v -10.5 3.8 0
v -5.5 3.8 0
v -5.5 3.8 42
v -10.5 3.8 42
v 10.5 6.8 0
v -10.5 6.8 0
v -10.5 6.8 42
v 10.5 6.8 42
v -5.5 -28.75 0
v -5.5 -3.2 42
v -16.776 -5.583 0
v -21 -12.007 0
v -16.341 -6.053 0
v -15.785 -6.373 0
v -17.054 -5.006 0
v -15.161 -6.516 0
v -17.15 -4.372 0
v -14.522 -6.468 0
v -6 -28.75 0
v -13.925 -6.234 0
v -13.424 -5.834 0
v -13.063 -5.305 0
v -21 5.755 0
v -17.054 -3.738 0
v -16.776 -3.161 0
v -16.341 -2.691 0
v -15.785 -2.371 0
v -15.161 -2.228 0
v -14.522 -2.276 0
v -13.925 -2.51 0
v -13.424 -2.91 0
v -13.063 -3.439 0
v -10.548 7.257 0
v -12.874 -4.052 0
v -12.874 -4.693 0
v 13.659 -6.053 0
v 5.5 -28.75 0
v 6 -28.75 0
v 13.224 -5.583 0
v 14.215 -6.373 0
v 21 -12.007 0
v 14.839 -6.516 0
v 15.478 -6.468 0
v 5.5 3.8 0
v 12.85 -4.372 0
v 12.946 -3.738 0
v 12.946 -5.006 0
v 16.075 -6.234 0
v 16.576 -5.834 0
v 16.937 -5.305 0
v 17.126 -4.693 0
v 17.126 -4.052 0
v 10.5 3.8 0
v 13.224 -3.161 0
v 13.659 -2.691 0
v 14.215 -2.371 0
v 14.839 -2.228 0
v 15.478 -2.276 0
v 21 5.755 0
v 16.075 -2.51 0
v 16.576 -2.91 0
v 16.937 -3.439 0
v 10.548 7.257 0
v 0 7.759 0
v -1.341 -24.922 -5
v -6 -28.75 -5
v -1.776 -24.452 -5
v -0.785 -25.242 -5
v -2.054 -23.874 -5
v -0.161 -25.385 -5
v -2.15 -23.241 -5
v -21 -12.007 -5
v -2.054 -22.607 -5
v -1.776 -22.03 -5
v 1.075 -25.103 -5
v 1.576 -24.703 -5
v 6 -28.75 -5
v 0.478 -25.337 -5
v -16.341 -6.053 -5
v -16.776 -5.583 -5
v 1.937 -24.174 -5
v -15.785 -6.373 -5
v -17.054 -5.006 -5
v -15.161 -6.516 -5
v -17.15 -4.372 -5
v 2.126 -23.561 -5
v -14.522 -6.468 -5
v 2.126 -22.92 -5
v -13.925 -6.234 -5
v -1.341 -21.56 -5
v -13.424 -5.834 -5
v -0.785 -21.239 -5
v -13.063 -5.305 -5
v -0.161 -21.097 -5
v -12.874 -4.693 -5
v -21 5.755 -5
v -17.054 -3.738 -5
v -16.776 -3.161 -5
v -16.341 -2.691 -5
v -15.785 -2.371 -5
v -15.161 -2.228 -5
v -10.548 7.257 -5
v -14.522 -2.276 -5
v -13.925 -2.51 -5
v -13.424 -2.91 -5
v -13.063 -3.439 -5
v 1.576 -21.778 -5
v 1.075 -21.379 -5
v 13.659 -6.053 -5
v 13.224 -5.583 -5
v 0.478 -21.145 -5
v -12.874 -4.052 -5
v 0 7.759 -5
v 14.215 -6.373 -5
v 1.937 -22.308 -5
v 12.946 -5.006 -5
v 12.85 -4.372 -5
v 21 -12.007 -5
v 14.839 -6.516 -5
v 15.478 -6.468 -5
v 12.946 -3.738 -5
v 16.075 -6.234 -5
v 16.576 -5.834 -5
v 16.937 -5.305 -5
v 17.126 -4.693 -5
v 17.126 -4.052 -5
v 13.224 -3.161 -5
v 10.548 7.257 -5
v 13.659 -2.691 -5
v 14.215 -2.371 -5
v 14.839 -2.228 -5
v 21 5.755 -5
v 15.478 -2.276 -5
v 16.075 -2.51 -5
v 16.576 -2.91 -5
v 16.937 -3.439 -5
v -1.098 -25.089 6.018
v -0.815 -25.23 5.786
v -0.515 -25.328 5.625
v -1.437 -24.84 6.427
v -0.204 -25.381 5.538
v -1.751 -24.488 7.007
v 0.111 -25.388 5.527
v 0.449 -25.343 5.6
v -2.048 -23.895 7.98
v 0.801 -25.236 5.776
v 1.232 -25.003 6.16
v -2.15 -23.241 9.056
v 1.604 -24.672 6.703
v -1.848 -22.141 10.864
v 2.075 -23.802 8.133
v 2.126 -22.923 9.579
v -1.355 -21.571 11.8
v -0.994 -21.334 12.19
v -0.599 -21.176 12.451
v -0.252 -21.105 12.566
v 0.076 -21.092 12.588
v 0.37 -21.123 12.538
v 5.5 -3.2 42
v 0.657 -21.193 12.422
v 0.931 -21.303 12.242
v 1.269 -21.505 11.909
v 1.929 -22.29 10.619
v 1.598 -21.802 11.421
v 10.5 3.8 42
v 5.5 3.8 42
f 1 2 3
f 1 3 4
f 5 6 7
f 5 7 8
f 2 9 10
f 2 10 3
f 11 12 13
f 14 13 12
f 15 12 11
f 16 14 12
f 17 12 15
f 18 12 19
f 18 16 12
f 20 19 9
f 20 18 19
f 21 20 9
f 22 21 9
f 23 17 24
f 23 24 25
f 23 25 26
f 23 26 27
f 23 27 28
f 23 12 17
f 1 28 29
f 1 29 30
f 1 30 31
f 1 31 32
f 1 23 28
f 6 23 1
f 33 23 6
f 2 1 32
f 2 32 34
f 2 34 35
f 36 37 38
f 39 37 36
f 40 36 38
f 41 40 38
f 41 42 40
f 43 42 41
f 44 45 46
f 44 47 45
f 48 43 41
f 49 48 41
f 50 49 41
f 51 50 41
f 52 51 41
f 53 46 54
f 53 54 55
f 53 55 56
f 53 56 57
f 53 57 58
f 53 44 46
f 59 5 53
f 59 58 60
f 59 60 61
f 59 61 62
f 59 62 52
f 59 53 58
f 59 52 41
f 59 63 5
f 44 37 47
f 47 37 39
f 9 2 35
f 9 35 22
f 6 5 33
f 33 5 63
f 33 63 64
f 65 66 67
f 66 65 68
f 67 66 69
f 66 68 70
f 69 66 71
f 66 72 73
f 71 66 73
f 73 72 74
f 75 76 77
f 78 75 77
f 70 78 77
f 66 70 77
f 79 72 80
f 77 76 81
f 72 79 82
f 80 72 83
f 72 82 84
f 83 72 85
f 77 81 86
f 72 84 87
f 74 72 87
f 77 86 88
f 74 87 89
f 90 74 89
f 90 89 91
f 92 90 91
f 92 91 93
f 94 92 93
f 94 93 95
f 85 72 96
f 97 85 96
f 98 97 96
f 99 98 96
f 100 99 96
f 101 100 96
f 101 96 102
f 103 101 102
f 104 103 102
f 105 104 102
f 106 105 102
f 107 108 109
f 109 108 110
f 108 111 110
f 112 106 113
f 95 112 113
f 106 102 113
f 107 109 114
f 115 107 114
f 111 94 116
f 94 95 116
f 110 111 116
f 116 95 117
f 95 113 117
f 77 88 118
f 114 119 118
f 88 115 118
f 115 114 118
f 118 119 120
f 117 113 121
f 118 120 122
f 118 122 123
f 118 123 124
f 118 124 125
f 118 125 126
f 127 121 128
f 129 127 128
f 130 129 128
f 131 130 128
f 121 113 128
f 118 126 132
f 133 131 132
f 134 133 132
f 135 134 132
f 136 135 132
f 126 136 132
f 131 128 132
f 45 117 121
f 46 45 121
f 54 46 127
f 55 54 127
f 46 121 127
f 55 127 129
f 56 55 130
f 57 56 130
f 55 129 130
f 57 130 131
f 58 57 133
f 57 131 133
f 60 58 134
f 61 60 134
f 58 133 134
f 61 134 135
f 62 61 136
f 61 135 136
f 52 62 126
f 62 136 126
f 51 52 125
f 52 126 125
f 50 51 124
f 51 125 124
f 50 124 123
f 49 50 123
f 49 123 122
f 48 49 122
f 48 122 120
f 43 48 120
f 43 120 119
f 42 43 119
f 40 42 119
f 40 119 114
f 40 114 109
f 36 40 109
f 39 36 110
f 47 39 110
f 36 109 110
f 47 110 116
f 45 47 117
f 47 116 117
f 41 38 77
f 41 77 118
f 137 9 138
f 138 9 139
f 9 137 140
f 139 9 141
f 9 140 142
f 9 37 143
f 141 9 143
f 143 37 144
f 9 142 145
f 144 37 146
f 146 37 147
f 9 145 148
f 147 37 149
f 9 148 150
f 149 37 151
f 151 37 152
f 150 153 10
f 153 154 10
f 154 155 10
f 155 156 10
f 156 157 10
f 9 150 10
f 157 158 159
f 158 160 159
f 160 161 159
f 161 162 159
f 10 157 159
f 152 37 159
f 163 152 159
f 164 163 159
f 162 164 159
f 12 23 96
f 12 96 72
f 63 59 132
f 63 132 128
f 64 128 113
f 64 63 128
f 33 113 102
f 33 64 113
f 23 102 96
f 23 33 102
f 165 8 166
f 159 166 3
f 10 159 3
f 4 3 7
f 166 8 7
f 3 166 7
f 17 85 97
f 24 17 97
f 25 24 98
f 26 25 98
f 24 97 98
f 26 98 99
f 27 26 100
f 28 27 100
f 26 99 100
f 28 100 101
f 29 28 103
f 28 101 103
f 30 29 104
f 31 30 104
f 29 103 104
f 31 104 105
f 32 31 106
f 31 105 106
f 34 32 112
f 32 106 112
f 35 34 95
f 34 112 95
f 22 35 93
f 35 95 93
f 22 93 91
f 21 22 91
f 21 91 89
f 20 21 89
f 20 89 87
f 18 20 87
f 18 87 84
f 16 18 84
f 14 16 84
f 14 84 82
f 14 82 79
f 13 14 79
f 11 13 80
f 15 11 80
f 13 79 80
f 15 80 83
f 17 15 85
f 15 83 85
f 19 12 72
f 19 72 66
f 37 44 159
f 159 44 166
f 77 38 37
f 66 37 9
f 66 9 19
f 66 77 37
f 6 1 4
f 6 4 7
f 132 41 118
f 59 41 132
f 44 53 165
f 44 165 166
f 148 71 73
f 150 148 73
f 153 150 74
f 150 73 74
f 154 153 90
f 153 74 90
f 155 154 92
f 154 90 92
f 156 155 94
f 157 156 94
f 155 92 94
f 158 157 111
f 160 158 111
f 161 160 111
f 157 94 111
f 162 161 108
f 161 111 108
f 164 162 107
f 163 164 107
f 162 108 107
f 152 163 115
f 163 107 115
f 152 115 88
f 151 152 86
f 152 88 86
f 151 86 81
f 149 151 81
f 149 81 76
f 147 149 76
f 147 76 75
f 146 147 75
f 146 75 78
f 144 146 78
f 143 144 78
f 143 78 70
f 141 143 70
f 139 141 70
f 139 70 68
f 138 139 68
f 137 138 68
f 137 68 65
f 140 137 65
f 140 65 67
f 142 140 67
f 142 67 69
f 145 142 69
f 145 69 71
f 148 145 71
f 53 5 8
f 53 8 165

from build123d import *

# Parameters (mm, degrees)
BOSS_EXTRUDE1_DEPTH      = 42
BOSS_EXTRUDE3_DEPTH      = 5
SKETCH5_R                = 2.15
CUT_EXTRUDE4_DEPTH       = 5
BOSS_EXTRUDE4_DEPTH      = 8
BOSS_EXTRUDE4_DEPTH_BACK = 8
ENL_V_START              = -42
ESQUISSE2_W              = 18.319626144
ESQUISSE2_H              = 0.2
ENL_V_MAT_EXTRU_1_DEPTH  = 42
ESQUISSE4_W              = 42
ESQUISSE4_H              = 5
BOSS_EXTRU_2_DEPTH       = 15
ESQUISSE5_R              = 2.15
ENL_V_MAT_EXTRU_2_DEPTH  = 28
ENL_V_START_2            = -5
ENL_V_MAT_EXTRU_3_DEPTH  = 5
BOSS_EXTRU_3_DEPTH       = 5.8
BOSS_EXTRU_4_DEPTH       = 15
ESQUISSE14_W             = 44.082286315
ESQUISSE14_H             = 62.535336401
ENL_V_MAT_EXTRU_4_DEPTH  = 50
BOSS_EXTRU_5_DEPTH       = 42
BOSS_EXTRU_7_DEPTH       = 11
ESQUISSE20_R             = 2.15
ENL_V_MAT_EXTRU_7_DEPTH  = 42
BOSS_EXTRU_8_START       = -5
BOSS_EXTRU_8_DEPTH       = 5


# Read off the part's stored shape, not the designer's step: Enlèv. mat.-Extru.3
with BuildPart() as part:
    # Sketch1 → Boss-Extrude1 (new body)
    with BuildSketch(Plane.XY):
        Polygon((-8.8, 3), (-6.002154051, -3), (6.002154051, -3), (8.8, 3), align=None)
    extrude(amount=BOSS_EXTRUDE1_DEPTH)

    # Sketch2 → Boss-Extrude3 (add)
    with BuildSketch(Plane(origin=(0, 0, 0), x_dir=(-1, 0, 0), z_dir=(0, 0, -1))):
        with BuildLine():
            Line((21, 4.736174234), (21, -13.75))
            Line((21, -13.75), (-21, -13.75))
            Line((-21, -13.75), (-21, 4.736174234))
            ThreePointArc((-21, 4.736174234), (0, 6.759324864), (21, 4.736174234))
        make_face()
    extrude(amount=BOSS_EXTRUDE3_DEPTH)

    # Sketch5 → Cut-Extrude4 (cut)
    with BuildSketch(Plane(origin=(0, 0, -5), x_dir=(-1, 0, 0), z_dir=(0, 0, -1))):
        with Locations((-15, -4.37207547)):
            Circle(SKETCH5_R)
        with Locations((15, -4.37207547)):
            Circle(SKETCH5_R)
    extrude(amount=-CUT_EXTRUDE4_DEPTH, mode=Mode.SUBTRACT)

    # Sketch4 → Boss-Extrude4 (add, two sides: drawn at the far end of the back side and taken through both)
    with BuildSketch(Plane.ZY.offset(-BOSS_EXTRUDE4_DEPTH_BACK)):
        Polygon((42, -3), (0, -3), (0, -26), (15, -26), (15, -17.785714286), align=None)
    extrude(amount=BOSS_EXTRUDE4_DEPTH + BOSS_EXTRUDE4_DEPTH_BACK)

    # Esquisse2 → Enlèv. mat.-Extru.1 (cut)
    with BuildSketch(Plane.XY.offset(42).offset(ENL_V_START)):
        with Locations((-0.359813072, 2.9)):
            Rectangle(ESQUISSE2_W, ESQUISSE2_H)
    extrude(amount=ENL_V_MAT_EXTRU_1_DEPTH, mode=Mode.SUBTRACT)

    # Esquisse4 → Boss.-Extru.2 (add)
    with BuildSketch(Plane.XZ.offset(13.75)):
        with Locations((0, -2.5)):
            Rectangle(ESQUISSE4_W, ESQUISSE4_H)
    extrude(amount=BOSS_EXTRU_2_DEPTH)

    # Esquisse5 → Enlèv. mat.-Extru.2 (cut)
    with BuildSketch(Plane(origin=(0, 0, -5), x_dir=(-1, 0, 0), z_dir=(0, 0, -1))):
        with Locations((0, -23.240675136)):
            Circle(ESQUISSE5_R)
    extrude(amount=-ENL_V_MAT_EXTRU_2_DEPTH, mode=Mode.SUBTRACT)

    # Enlèv. mat.-Extru.3 outline → Enlèv. mat.-Extru.3 (cut)
    with BuildSketch(Plane(origin=(0, 0, -5), x_dir=(-1, 0, 0), z_dir=(0, 0, -1)).offset(ENL_V_START_2)):
        Polygon((21, -12.006912883), (6, -28.75), (21, -28.75), align=None)
        Polygon((-6, -28.75), (-21, -12.006912883), (-21, -28.75), align=None)
    extrude(amount=ENL_V_MAT_EXTRU_3_DEPTH, mode=Mode.SUBTRACT)

    # Esquisse7 → Boss.-Extru.3 (add)
    with BuildSketch(Plane(origin=(0, 2.8, 0), x_dir=(1, 0, 0), z_dir=(0, 1, 0))):
        with BuildLine():
            Line((2.5, -42), (0, -42))
            Line((0, -42), (-2.5, -42))
            Line((-2.5, -42), (-2.5, -42.178964355))
            ThreePointArc((-2.5, -42.178964355), (0, -47.633030278), (2.5, -42.178964355))
            Line((2.5, -42.178964355), (2.5, -42))
        make_face()
    extrude(amount=-BOSS_EXTRU_3_DEPTH)

    # Esquisse9 → Boss.-Extru.4 (add)
    with BuildSketch(Plane.XY):
        Polygon((8, -26), (8, -26.146615259), (6, -28.75), (-6, -28.75), (-8, -26.360097245), (-8, -26), align=None)
    extrude(amount=BOSS_EXTRU_4_DEPTH)

    # Esquisse14 → Enlèv. mat.-Extru.4 (cut)
    with BuildSketch(Plane.XY):
        with Locations((2.134773814, -3.901083115)):
            Rectangle(ESQUISSE14_W, ESQUISSE14_H)
    extrude(amount=ENL_V_MAT_EXTRU_4_DEPTH, mode=Mode.SUBTRACT)

    # Esquisse15 → Boss.-Extru.5 (add)
    with BuildSketch(Plane.XY):
        Polygon((-10.5, 6.8), (10.5, 6.8), (10.5, 3.8), (5.5, 3.8), (5.5, -3.2), (-5.5, -3.2), (-5.5, 3.8), (-10.5, 3.8), align=None)
    extrude(amount=BOSS_EXTRU_5_DEPTH)

    # Esquisse16 → Boss.-Extru.7 (add)
    with BuildSketch(Plane(origin=(5.5, 0, 0), x_dir=(0, 0, -1), z_dir=(1, 0, 0))):
        Polygon((0, -3.2), (0, -28.75), (-42, -3.2), align=None)
    extrude(amount=-BOSS_EXTRU_7_DEPTH)

    # Esquisse20 → Enlèv. mat.-Extru.7 (cut)
    with BuildSketch(Plane(origin=(0, 0, 0), x_dir=(-1, 0, 0), z_dir=(0, 0, -1))):
        with Locations((0, -23.240675136)):
            Circle(ESQUISSE20_R)
    extrude(amount=-ENL_V_MAT_EXTRU_7_DEPTH, mode=Mode.SUBTRACT)

    # Esquisse21 → Boss.-Extru.8 (add)
    with BuildSketch(Plane(origin=(0, 0, -5), x_dir=(-1, 0, 0), z_dir=(0, 0, -1)).offset(BOSS_EXTRU_8_START)):
        with BuildLine():
            Line((-21, 4.736174234), (-21, 5.754737611))
            ThreePointArc((-21, 5.754737611), (0, 7.759324864), (21, 5.754737611))
            Line((21, 5.754737611), (21, 4.736174234))
            ThreePointArc((21, 4.736174234), (0, 6.759324864), (-21, 4.736174234))
        make_face()
    extrude(amount=BOSS_EXTRU_8_DEPTH)


solid = part.part
